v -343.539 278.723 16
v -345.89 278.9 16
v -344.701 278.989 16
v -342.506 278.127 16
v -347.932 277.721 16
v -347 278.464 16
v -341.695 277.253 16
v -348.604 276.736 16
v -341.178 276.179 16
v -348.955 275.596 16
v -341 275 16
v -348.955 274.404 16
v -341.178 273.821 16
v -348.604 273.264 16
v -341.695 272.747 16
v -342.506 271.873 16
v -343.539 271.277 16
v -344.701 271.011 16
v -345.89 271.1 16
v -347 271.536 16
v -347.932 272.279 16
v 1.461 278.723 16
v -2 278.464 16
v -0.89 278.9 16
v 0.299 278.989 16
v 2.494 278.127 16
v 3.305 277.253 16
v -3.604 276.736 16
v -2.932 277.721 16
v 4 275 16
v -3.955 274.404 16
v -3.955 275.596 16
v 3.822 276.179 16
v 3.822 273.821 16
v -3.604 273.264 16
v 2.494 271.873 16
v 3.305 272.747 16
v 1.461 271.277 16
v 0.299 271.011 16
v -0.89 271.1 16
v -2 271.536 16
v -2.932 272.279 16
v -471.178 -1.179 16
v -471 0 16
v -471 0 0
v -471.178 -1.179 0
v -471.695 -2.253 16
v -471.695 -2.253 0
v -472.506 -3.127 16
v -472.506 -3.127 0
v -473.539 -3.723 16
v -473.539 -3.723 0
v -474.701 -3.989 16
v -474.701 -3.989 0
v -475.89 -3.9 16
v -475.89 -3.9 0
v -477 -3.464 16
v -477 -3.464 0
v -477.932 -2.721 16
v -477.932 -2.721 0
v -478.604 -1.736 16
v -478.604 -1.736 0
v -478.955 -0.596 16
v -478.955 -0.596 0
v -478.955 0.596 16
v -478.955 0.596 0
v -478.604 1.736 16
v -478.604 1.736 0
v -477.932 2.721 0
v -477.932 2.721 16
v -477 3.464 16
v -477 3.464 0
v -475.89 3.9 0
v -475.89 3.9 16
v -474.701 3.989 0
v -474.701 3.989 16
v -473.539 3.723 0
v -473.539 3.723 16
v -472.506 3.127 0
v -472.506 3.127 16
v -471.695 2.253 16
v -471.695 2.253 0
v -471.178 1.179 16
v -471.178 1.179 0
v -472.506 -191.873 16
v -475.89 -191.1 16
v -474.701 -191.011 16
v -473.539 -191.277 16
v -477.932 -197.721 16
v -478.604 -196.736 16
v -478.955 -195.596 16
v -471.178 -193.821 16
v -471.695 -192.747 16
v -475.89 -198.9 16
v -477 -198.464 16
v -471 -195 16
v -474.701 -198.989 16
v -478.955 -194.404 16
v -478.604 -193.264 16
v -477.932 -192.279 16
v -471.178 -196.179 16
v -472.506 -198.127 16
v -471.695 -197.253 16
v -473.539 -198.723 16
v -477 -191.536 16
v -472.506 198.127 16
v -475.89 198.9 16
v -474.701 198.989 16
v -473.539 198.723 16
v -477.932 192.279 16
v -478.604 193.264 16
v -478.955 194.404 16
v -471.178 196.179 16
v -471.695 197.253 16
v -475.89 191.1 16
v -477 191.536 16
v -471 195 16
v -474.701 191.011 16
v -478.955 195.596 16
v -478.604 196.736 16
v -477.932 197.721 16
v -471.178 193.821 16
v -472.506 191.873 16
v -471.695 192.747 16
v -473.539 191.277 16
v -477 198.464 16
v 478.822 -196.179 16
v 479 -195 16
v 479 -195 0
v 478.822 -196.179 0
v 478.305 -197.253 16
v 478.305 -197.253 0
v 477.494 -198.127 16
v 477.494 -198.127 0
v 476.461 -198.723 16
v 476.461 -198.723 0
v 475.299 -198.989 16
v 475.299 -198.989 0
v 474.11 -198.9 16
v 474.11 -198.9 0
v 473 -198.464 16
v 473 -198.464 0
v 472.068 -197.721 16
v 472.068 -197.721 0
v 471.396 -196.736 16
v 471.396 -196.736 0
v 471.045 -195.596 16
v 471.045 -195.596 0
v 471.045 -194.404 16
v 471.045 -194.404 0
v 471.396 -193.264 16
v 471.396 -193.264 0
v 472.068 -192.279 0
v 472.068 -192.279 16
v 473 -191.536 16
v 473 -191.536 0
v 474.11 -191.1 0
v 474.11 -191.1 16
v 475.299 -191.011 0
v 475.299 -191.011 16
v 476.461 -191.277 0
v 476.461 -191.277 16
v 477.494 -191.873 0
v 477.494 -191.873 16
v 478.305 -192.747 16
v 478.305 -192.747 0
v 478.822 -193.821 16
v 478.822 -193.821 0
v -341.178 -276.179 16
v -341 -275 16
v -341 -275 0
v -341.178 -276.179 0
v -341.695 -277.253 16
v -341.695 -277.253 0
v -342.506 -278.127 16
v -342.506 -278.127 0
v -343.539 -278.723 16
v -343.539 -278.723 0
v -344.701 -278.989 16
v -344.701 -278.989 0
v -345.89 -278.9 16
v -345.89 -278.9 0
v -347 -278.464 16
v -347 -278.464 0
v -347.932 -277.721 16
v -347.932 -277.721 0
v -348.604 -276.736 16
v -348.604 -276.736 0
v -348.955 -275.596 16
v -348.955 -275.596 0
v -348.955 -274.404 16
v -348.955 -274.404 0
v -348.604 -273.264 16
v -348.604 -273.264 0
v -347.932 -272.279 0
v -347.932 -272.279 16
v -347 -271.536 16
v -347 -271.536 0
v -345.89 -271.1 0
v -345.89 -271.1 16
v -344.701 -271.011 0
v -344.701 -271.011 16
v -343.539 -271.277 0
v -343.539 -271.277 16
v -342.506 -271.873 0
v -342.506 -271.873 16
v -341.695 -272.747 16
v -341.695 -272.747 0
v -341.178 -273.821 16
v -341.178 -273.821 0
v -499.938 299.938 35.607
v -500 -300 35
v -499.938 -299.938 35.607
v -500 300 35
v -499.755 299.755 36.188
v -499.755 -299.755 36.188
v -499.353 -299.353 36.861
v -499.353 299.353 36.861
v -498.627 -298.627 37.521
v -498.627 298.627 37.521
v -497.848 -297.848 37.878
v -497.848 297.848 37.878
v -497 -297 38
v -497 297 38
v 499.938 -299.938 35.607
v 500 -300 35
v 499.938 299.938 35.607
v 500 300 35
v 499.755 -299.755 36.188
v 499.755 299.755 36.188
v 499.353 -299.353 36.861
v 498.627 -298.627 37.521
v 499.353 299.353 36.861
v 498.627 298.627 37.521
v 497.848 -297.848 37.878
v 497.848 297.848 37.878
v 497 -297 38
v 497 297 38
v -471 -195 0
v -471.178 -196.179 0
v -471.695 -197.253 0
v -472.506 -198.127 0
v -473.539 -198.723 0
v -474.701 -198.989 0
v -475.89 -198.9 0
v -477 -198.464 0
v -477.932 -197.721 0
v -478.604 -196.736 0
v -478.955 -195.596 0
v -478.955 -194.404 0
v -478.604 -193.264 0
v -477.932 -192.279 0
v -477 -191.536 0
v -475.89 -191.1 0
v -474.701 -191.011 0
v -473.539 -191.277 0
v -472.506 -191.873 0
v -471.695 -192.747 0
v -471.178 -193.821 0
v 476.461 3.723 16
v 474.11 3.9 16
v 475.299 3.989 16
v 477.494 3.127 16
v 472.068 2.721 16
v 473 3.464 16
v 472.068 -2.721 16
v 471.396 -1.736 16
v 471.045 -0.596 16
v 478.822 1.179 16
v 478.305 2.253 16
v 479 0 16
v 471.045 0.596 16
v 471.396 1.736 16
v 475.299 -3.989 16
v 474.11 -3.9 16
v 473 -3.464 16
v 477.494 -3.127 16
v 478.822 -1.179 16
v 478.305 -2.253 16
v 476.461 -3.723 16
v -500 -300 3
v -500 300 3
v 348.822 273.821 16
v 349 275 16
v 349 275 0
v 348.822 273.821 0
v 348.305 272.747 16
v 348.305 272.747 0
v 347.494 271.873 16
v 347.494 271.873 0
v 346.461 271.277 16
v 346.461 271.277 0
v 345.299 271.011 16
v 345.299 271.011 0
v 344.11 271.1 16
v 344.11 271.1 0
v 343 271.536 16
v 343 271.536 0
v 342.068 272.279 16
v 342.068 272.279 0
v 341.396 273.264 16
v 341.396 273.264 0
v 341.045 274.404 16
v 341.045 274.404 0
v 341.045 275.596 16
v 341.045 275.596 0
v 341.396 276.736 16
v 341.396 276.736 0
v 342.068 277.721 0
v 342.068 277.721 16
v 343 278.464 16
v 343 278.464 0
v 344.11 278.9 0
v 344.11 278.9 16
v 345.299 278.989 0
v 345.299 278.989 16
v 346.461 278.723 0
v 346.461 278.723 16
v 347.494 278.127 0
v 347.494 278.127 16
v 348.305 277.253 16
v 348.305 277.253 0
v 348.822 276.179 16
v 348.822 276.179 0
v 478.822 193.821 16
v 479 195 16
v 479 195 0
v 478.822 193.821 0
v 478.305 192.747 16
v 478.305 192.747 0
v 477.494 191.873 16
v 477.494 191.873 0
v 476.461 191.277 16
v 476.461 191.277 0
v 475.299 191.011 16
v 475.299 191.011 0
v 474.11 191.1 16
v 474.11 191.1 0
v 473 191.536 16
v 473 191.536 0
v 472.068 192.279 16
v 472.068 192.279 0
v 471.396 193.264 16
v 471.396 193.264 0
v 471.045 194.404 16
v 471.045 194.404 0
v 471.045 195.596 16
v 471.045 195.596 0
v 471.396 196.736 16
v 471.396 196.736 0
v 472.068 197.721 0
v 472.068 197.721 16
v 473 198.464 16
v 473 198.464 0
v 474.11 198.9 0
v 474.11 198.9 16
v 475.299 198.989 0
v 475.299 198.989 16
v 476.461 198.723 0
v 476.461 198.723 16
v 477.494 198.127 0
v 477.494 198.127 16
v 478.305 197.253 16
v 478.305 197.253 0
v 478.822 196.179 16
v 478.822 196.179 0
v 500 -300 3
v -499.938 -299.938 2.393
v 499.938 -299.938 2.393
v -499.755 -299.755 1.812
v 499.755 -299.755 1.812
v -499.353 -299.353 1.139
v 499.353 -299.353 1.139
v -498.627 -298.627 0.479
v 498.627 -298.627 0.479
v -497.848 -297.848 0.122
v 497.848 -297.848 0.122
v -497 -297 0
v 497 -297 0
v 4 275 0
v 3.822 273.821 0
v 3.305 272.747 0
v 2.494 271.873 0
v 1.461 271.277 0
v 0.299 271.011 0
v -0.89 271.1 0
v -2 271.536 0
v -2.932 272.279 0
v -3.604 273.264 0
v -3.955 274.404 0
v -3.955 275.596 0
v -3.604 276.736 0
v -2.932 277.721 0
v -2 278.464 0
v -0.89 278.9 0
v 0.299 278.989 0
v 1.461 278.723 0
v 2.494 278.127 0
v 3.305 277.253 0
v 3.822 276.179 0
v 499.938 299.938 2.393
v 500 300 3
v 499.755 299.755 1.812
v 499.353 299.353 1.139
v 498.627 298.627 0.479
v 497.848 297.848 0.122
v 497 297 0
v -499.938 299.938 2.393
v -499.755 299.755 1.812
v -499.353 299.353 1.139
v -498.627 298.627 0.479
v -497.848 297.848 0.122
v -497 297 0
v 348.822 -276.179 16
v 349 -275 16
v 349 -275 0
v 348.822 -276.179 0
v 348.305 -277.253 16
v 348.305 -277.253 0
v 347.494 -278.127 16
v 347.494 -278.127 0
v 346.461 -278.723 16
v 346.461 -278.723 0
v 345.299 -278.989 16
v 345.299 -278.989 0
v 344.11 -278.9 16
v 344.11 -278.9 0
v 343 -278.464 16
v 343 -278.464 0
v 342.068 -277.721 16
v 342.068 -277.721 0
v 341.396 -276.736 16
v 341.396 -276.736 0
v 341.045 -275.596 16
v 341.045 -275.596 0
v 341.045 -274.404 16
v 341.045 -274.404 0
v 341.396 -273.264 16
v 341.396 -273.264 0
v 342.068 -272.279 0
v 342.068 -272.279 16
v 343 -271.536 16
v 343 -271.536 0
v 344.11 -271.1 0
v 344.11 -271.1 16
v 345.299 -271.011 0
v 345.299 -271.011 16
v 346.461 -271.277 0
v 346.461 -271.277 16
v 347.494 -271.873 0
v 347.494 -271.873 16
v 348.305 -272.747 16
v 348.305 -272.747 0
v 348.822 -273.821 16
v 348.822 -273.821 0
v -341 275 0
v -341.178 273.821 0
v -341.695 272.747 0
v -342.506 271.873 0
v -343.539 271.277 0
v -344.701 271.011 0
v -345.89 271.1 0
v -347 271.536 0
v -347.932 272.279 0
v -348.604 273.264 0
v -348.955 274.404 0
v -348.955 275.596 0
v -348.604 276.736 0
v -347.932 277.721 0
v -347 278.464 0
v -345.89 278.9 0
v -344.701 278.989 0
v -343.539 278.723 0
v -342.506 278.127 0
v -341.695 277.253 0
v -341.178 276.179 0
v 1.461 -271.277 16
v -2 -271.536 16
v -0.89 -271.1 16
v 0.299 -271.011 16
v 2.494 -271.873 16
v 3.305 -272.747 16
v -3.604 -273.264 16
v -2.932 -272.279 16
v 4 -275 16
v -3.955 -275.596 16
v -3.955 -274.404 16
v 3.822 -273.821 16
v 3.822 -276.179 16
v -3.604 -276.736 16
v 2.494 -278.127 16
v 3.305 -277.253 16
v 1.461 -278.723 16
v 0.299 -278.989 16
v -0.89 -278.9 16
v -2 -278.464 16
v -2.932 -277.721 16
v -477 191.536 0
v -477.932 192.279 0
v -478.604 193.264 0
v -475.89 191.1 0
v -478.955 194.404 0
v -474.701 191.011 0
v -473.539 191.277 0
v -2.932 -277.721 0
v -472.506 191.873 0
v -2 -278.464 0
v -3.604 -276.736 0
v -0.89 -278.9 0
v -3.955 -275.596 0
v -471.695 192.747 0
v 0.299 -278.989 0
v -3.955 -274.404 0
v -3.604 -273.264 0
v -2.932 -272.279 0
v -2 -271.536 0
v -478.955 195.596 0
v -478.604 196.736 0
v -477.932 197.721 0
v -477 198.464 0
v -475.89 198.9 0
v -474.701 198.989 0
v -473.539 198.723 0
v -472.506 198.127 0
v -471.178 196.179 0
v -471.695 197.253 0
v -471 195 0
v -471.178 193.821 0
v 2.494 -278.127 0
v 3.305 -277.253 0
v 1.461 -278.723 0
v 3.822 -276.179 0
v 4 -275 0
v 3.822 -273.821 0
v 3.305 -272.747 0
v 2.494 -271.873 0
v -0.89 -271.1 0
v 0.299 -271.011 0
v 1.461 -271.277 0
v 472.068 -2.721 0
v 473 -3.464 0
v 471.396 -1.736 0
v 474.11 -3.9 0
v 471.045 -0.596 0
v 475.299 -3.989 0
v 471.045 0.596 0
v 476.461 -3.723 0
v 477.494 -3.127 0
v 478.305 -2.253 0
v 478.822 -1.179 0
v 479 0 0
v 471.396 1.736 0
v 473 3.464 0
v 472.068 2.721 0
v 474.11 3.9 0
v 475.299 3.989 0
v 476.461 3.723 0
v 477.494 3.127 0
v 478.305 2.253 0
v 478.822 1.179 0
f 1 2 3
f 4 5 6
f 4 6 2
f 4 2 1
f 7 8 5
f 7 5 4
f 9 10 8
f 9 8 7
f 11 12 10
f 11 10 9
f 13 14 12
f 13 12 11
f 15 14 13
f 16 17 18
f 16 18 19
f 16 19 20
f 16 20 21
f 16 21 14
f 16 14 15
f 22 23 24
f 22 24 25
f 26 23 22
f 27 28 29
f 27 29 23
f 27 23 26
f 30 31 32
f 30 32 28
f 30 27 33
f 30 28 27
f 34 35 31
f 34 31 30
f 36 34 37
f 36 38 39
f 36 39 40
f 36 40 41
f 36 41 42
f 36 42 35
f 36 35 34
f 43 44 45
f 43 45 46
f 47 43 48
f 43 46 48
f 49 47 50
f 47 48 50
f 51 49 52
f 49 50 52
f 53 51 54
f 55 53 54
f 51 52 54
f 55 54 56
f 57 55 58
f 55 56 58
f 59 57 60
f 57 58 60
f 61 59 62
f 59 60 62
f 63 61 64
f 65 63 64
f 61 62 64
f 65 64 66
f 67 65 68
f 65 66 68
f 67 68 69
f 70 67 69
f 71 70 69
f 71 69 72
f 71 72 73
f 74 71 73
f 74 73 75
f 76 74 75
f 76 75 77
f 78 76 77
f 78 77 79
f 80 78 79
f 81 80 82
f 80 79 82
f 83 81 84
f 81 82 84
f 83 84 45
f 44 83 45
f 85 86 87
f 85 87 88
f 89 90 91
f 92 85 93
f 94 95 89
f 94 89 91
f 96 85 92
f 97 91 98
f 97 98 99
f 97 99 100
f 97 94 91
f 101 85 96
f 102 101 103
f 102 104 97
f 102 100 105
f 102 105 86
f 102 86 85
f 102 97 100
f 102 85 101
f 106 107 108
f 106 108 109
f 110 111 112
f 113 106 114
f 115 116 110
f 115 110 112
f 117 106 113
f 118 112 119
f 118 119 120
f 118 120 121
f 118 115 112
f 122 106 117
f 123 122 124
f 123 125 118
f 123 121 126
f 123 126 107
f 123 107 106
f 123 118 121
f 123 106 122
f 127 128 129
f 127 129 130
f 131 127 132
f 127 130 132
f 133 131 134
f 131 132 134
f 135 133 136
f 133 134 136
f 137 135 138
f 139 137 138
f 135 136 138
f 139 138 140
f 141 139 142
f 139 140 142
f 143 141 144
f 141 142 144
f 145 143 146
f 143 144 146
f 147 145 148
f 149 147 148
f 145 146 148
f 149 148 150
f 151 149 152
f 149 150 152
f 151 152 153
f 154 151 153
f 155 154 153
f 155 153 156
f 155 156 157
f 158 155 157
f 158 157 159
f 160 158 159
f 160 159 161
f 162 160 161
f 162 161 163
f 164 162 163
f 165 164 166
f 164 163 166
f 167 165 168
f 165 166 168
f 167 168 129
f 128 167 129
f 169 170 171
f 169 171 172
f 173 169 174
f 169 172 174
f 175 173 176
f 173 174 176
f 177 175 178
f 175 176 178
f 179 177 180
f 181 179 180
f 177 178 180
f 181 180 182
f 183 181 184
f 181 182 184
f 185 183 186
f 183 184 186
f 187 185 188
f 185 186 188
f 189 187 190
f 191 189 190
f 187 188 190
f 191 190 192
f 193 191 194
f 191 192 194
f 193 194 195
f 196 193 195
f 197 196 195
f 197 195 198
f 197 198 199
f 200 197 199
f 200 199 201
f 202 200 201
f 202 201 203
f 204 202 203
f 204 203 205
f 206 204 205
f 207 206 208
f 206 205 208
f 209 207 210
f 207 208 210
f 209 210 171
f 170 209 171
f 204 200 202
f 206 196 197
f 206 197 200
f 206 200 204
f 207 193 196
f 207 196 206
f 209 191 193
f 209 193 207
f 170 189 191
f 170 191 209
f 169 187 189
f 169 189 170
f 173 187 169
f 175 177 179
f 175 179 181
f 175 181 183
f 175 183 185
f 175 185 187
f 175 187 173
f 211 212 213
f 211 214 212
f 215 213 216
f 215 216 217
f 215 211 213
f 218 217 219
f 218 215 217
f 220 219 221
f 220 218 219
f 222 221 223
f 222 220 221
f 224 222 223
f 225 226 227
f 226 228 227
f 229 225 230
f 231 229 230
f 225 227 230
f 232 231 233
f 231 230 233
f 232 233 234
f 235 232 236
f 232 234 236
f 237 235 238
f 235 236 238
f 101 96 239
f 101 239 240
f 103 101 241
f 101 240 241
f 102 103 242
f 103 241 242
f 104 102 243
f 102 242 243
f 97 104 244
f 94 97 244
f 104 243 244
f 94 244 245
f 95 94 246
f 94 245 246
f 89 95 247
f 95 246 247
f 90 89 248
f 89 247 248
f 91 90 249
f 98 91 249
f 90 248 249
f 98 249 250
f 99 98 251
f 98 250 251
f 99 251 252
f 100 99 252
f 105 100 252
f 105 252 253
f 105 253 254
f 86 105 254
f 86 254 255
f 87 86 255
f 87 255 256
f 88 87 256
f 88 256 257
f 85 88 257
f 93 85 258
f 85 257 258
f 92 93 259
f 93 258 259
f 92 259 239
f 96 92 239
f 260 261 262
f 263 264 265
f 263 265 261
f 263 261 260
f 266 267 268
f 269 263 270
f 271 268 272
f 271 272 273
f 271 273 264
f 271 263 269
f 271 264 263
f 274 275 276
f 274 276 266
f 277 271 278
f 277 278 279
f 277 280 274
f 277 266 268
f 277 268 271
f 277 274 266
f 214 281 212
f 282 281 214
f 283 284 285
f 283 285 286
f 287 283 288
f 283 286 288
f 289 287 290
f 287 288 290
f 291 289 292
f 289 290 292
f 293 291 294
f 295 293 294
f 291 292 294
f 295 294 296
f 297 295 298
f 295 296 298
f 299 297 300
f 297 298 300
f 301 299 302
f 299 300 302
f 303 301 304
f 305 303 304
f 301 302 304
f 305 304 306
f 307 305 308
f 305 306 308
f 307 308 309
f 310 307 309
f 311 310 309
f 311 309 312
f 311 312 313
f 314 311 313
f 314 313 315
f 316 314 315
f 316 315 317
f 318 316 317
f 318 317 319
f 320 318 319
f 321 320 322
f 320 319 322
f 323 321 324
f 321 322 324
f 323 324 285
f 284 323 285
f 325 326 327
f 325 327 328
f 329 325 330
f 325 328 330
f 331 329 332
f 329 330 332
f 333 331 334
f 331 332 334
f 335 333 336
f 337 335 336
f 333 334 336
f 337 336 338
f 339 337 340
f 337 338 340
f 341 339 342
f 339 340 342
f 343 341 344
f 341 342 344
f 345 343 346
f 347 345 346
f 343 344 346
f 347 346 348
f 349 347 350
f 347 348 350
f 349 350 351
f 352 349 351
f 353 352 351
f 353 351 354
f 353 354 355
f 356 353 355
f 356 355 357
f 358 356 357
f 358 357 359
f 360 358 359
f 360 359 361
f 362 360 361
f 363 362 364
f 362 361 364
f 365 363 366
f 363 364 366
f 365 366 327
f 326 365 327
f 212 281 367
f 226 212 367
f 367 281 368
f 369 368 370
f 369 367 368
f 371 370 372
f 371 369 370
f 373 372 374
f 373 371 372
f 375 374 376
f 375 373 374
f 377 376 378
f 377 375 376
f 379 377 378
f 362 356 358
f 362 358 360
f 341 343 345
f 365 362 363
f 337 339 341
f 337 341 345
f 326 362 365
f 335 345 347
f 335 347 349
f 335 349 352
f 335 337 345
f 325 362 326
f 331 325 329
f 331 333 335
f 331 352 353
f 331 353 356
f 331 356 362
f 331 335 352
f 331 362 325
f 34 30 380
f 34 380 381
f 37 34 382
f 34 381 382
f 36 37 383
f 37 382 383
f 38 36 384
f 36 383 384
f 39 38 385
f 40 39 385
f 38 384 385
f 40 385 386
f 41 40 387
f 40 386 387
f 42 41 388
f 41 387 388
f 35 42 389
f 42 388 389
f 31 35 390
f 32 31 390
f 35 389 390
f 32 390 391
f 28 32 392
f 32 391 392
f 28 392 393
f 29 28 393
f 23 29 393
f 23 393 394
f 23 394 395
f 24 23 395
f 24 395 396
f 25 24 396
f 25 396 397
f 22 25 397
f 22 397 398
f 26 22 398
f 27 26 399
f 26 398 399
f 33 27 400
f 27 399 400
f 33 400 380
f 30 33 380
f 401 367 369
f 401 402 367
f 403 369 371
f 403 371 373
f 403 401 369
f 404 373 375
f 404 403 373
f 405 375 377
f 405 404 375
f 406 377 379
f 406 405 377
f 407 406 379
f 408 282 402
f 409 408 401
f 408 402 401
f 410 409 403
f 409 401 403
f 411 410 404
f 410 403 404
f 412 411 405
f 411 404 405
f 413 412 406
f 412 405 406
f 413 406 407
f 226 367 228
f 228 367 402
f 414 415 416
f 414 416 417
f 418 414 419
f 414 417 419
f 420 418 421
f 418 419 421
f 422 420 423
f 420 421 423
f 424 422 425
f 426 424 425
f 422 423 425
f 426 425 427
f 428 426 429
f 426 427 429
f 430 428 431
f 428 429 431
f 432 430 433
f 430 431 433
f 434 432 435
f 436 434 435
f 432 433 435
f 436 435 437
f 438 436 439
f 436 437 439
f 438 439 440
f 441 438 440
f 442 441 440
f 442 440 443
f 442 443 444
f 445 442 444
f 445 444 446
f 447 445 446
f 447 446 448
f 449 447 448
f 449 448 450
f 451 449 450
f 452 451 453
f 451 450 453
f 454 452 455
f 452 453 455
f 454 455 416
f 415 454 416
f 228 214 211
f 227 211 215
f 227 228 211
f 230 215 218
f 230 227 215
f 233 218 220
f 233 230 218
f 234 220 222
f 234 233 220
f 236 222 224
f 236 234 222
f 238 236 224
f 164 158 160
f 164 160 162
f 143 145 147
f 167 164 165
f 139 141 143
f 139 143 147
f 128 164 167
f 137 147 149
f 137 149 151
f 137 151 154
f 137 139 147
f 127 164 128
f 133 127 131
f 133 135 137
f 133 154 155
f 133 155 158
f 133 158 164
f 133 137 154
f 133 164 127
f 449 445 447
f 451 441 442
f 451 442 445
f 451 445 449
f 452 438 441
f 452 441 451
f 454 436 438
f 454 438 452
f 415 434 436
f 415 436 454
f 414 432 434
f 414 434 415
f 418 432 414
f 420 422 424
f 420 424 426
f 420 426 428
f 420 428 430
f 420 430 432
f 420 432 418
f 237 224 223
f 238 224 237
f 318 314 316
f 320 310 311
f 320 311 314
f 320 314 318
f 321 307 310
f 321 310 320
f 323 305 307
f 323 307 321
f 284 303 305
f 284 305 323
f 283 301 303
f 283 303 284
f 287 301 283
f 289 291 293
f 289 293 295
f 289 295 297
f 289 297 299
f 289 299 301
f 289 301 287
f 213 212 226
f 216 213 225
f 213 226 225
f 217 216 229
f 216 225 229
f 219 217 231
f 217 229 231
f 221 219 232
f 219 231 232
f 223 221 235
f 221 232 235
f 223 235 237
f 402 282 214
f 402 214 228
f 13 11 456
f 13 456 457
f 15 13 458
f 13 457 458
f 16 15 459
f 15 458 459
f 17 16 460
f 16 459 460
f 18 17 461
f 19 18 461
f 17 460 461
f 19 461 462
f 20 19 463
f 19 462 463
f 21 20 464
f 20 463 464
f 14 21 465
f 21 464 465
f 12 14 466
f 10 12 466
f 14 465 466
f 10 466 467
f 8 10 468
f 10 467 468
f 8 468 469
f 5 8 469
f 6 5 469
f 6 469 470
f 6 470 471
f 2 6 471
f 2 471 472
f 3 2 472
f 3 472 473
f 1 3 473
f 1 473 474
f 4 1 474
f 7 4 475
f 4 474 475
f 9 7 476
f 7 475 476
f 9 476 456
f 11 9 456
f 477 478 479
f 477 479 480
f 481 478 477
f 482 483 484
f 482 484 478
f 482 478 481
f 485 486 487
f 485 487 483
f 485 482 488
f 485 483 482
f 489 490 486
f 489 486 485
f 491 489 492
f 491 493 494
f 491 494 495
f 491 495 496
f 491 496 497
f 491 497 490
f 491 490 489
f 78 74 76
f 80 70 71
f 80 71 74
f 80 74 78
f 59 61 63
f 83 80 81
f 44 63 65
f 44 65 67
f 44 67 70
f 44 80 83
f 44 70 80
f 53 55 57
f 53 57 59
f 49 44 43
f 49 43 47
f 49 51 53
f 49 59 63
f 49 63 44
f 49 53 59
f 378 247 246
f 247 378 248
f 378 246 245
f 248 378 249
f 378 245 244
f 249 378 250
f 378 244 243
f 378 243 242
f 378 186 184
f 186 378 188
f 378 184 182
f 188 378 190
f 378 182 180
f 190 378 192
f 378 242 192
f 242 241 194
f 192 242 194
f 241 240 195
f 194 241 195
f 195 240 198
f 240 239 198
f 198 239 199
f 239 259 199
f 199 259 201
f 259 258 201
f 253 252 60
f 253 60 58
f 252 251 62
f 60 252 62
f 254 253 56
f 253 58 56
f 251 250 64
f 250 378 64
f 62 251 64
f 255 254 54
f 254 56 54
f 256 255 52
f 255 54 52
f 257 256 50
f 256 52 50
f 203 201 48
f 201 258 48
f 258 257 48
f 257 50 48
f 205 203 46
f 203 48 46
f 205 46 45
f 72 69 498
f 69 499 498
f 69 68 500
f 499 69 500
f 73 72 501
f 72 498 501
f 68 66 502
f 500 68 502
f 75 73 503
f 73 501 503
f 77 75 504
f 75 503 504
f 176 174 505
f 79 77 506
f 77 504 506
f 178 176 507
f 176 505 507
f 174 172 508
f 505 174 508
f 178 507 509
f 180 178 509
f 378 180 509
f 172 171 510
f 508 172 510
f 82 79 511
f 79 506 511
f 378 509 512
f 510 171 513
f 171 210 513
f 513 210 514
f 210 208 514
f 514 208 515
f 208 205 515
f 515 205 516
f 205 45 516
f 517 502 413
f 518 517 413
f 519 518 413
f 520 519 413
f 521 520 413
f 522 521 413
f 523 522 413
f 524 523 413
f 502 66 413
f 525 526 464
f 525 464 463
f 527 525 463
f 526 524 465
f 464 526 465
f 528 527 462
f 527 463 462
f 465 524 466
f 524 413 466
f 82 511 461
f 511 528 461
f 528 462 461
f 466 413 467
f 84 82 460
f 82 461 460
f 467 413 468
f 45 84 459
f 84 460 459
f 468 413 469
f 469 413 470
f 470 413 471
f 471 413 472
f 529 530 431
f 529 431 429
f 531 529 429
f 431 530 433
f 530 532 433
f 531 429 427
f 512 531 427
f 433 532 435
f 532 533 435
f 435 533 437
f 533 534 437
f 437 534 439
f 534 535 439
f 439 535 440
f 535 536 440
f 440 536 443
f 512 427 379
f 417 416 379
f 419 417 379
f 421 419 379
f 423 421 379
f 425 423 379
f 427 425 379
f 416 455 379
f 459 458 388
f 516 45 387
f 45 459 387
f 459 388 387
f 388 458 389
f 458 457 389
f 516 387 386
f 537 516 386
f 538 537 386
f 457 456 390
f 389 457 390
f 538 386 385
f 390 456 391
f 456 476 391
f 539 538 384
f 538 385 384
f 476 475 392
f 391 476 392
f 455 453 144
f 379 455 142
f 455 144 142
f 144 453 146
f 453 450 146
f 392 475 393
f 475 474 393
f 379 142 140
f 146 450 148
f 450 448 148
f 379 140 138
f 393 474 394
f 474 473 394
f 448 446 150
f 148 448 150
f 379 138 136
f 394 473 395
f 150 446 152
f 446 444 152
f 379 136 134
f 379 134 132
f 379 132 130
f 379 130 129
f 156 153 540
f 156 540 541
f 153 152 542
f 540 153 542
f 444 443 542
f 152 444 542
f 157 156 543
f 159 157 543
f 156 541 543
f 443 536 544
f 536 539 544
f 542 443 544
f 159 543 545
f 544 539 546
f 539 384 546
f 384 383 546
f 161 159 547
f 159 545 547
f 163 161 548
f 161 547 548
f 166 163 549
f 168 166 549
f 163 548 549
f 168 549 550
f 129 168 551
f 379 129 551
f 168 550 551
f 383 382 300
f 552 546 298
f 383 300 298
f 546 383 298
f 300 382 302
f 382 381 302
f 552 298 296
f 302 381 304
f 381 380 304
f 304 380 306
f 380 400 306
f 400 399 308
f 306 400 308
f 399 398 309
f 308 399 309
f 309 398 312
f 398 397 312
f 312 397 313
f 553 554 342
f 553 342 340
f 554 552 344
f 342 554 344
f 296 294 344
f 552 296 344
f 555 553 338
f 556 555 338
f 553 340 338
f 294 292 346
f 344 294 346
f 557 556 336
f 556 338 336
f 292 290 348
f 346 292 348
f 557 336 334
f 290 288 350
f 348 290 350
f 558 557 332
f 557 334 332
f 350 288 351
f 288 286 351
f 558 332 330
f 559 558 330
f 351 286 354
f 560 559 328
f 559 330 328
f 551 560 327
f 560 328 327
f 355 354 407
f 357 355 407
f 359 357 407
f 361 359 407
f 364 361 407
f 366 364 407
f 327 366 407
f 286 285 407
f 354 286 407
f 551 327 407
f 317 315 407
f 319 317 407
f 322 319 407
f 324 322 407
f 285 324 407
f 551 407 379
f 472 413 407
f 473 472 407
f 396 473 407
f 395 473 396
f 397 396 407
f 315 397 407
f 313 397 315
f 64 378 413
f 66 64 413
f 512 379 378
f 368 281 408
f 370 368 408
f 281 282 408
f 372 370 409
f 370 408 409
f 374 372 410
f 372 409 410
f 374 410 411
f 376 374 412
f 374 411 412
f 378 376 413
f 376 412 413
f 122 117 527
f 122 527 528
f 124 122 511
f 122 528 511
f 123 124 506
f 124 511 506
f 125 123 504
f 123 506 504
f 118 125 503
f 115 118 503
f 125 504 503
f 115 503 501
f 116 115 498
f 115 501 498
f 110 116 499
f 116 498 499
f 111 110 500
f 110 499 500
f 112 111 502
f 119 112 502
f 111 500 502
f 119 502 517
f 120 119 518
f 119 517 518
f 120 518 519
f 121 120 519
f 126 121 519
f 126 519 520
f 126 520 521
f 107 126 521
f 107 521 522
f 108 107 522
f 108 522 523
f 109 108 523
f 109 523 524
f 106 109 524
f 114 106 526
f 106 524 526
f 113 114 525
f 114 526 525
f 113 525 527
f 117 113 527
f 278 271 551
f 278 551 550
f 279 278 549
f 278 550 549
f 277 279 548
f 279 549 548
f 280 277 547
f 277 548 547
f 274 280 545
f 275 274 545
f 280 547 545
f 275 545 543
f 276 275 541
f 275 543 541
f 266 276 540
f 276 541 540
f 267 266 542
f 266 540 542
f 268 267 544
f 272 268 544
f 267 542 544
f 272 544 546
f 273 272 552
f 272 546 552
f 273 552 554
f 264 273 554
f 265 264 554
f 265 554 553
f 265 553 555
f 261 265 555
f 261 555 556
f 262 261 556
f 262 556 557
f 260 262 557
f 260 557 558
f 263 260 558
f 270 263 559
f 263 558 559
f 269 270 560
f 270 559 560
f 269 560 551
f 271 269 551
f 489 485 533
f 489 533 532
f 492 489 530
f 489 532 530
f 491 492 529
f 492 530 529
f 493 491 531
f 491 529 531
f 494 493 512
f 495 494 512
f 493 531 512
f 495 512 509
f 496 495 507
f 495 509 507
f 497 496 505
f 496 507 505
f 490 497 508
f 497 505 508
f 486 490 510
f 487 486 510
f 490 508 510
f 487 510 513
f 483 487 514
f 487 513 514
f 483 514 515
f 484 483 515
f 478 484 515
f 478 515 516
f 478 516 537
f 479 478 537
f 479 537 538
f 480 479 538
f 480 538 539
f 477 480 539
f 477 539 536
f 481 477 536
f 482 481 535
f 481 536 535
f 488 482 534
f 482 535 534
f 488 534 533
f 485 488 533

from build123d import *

# Parameters (mm, degrees)
F0_W     = 1000
F0_H     = 600
F1_DEPTH = 38
F2_R     = 3
F3_R     = 4
F4_DEPTH = 16


with BuildPart() as f1:
    # F0 (on Top) → F1 (new body)
    with BuildSketch(Plane.XY):
        Rectangle(F0_W, F0_H)
    extrude(amount=F1_DEPTH)

    # F2
    f2_edges = [f1.edges().sort_by_distance(p)[0] for p in [
        (0, 300, 38),
        (500, 0, 38),
        (0, -300, 38),
        (-500, 0, 38),
        (500, 0, 0),
        (0, 300, 0),
        (-500, 0, 0),
        (0, -300, 0),
    ]]
    fillet(f2_edges, radius=F2_R)

    # F3 (on face) → F4 (cut)
    with BuildSketch(Plane(origin=(0, 0, 0), x_dir=(1, 0, 0), z_dir=(0, 0, -1))):
        with Locations((-345, 275)):
            Circle(F3_R)
        with Locations((0, 275)):
            Circle(F3_R)
        with Locations((345, 275)):
            Circle(F3_R)
        with Locations((345, -275)):
            Circle(F3_R)
        with Locations((0, -275)):
            Circle(F3_R)
        with Locations((-345, -275)):
            Circle(F3_R)
        with Locations((-475, 0)):
            Circle(F3_R)
        with Locations((-475, -195)):
            Circle(F3_R)
        with Locations((-475, 195)):
            Circle(F3_R)
        with Locations((475, 195)):
            Circle(F3_R)
        with Locations((475, 0)):
            Circle(F3_R)
        with Locations((475, -195)):
            Circle(F3_R)
    extrude(amount=-F4_DEPTH, mode=Mode.SUBTRACT)


solid = f1.part
